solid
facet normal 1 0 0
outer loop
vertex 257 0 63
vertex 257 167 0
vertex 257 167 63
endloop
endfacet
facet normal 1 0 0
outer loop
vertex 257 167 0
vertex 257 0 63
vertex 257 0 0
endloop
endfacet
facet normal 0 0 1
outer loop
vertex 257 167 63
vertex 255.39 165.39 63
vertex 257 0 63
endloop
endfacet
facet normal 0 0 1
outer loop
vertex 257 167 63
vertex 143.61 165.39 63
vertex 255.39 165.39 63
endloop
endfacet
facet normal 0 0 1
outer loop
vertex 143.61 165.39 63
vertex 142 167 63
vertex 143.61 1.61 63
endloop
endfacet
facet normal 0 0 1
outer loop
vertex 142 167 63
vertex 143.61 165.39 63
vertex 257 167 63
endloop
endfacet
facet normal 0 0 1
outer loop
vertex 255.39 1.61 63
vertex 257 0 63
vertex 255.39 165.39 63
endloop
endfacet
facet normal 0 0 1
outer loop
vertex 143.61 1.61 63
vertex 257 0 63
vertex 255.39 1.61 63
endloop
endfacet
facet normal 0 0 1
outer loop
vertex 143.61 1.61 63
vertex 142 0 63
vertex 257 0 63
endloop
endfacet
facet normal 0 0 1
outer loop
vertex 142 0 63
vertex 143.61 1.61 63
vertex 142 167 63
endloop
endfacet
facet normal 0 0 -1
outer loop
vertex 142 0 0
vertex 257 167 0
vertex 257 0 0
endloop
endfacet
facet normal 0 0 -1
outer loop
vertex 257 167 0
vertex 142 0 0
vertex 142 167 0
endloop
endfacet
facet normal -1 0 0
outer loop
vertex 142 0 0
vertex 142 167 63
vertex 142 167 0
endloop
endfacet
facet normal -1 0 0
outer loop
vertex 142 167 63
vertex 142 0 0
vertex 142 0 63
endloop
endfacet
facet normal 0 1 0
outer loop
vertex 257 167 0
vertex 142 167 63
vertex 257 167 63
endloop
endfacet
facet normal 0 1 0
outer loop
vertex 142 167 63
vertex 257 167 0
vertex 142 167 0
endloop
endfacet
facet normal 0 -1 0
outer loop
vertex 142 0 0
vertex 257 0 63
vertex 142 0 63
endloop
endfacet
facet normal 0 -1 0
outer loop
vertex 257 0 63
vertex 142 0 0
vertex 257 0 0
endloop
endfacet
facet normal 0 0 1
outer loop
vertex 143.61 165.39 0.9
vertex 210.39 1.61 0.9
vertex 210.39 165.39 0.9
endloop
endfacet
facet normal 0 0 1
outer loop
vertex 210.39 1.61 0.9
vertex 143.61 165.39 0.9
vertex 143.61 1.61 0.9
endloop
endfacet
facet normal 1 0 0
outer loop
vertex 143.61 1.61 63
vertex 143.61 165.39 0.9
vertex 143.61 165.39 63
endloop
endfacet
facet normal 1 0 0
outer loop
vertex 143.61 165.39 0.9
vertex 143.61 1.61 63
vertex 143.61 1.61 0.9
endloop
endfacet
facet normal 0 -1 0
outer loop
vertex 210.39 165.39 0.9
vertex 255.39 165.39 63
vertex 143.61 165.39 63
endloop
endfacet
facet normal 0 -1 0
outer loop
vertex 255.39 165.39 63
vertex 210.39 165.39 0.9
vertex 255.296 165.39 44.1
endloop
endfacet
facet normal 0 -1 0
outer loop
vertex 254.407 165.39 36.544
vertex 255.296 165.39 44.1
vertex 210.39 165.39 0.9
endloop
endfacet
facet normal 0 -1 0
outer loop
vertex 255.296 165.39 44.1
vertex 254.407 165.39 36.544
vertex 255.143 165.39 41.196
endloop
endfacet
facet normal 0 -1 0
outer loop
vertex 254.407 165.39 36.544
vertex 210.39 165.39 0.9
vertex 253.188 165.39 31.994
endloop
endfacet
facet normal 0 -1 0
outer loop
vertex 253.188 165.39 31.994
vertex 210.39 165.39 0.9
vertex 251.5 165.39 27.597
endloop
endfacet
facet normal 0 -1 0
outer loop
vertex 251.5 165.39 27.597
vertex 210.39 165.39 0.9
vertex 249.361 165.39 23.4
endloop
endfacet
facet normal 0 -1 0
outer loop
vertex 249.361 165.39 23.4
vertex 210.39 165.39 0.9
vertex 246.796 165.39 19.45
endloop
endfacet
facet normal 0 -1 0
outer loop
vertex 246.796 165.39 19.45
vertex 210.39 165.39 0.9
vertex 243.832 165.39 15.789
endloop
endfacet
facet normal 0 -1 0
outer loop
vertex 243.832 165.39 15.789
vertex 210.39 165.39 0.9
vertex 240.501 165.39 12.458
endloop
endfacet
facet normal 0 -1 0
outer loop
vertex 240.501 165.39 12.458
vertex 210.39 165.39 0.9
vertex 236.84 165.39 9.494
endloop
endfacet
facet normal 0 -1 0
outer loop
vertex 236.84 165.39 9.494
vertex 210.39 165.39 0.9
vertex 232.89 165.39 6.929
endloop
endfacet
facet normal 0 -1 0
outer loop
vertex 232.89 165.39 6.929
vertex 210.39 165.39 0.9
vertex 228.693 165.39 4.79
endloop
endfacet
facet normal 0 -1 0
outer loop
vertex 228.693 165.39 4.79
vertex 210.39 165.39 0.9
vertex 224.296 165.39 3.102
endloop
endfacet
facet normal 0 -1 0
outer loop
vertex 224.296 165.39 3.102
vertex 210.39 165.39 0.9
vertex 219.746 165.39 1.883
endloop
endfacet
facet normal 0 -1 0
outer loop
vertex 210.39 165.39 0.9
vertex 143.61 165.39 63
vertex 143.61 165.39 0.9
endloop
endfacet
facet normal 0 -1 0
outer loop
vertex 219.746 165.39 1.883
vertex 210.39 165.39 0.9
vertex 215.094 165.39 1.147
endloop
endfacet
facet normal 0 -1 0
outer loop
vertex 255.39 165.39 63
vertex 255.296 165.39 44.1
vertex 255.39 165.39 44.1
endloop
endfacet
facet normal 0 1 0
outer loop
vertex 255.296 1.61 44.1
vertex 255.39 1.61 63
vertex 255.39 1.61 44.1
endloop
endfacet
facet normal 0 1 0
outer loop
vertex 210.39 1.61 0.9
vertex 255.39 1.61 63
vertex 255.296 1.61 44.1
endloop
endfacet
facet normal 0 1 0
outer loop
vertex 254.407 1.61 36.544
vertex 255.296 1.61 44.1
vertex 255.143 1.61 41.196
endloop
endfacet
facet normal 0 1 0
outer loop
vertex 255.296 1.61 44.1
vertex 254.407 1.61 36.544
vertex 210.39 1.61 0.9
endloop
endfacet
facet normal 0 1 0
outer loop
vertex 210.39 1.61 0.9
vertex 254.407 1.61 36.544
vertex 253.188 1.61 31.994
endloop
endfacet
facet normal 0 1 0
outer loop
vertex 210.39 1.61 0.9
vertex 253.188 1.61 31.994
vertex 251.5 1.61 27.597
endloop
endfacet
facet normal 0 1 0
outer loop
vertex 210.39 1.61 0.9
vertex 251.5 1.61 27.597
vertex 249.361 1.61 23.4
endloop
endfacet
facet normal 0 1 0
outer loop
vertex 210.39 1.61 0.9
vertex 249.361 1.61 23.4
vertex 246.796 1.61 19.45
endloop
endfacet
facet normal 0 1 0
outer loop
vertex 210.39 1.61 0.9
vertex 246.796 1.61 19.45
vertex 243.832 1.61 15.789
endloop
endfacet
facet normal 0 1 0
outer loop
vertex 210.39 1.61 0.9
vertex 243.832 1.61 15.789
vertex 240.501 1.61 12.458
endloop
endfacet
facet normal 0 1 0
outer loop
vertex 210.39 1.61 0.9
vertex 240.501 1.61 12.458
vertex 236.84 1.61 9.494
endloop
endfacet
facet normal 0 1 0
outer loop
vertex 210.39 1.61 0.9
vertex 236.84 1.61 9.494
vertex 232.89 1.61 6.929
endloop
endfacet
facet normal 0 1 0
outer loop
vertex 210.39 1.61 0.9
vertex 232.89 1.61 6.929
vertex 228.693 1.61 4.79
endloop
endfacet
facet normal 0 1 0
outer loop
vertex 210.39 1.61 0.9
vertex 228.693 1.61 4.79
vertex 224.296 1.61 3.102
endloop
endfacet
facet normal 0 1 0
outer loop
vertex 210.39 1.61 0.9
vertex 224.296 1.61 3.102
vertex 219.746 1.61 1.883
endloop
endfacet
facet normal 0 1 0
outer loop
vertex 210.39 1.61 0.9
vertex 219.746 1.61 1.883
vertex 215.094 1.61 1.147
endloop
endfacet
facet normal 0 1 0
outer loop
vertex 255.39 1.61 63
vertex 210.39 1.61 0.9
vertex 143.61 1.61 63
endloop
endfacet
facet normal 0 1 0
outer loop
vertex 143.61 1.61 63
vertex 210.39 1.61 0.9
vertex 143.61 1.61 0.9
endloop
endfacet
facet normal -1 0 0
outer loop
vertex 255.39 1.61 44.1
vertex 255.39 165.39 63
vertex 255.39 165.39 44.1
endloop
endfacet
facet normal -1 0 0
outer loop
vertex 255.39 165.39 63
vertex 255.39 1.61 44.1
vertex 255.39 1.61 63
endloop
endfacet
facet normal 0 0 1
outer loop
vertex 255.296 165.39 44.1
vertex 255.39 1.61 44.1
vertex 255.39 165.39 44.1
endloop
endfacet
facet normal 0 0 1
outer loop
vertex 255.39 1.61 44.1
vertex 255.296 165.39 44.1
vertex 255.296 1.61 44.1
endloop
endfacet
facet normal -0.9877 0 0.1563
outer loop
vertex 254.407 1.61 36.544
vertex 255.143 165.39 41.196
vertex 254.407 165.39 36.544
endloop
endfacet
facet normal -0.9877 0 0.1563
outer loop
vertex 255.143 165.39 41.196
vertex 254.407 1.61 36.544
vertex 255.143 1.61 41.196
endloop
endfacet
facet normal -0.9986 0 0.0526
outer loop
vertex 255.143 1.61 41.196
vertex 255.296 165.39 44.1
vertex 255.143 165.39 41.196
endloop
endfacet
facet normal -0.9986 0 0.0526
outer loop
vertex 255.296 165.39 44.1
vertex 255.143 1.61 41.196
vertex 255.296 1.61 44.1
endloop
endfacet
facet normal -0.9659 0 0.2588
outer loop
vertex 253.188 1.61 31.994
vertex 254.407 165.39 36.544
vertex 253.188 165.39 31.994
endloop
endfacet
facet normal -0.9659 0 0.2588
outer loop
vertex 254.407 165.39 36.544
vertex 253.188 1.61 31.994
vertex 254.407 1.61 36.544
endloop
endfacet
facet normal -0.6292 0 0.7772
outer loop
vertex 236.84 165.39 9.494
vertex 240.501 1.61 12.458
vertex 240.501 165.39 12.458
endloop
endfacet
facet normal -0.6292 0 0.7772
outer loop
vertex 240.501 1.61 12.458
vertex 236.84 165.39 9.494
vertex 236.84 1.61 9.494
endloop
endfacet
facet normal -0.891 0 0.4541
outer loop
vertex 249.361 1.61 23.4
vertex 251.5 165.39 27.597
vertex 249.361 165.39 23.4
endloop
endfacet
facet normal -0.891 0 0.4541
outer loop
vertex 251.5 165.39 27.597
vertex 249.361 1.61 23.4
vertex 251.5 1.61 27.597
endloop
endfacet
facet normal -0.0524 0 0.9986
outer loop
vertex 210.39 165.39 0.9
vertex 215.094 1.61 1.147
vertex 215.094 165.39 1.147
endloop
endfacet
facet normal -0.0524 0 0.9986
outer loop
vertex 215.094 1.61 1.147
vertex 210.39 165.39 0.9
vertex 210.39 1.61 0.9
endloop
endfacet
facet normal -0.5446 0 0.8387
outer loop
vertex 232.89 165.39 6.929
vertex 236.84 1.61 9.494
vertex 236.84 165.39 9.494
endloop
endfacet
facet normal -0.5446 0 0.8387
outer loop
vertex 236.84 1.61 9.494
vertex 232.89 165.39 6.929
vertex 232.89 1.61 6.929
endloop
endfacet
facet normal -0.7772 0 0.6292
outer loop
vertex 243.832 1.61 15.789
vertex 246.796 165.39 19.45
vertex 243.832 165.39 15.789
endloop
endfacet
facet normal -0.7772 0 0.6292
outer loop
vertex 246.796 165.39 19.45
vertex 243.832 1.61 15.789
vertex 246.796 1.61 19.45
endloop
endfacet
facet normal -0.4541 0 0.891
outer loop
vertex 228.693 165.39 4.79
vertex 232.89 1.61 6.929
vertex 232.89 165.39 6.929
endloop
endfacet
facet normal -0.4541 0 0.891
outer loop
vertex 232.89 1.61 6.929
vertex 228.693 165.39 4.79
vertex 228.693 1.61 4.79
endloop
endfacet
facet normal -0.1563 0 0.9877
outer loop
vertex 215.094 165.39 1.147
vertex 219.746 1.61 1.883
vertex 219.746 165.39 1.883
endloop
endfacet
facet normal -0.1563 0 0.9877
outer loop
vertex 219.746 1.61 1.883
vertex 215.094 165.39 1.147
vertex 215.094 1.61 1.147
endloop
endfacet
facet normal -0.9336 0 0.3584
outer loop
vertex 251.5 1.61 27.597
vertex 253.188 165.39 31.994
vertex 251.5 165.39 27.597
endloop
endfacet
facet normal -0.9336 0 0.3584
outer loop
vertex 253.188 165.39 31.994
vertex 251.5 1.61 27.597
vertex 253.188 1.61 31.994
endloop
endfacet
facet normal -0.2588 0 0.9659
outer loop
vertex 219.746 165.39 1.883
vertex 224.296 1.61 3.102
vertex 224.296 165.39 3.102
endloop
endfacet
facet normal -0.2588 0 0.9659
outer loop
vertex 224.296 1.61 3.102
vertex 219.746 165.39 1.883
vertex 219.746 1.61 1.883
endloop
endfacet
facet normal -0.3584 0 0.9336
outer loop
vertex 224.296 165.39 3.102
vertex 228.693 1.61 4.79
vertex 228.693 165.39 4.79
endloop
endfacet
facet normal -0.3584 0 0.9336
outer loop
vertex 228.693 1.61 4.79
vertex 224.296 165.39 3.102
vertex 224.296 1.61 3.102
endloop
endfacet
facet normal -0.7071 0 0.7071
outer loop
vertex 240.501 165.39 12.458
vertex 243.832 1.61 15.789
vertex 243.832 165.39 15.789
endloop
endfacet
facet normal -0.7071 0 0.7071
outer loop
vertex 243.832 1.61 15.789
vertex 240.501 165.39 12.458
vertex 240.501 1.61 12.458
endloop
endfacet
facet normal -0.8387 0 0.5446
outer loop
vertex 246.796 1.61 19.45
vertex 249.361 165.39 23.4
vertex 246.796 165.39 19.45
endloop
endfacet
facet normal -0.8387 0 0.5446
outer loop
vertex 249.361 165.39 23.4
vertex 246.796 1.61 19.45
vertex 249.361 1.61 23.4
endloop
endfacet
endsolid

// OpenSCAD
% cube([258, 258, 64]);

// cards are 62x93
// cardboard is 63x102

// 20mm of crisis cards
// 30mm of door cards

$fn=60;


if (0) {
translate([0,90,0]) tenCharBox();
resourceBox();
translate([0,45,0]) resourceBox();
translate([143,0,0]) rotate([0,0,90]) villianBox();
}

translate([108+34,0,0]) misc1();

module misc1() {
   wid = 257-108-34;
   len = 167;
   rad = 45;

   difference() {
      cube([wid,len,63]);

      translate([1.61,1.61,0.9]) cube([wid-2*1.61-rad,len-2*1.61,63]);
      translate([1.61,1.61,rad+-.9]) cube([wid-2*1.61,len-2*1.61,63]);

      translate([wid-1.61-rad,1.61,0.9+rad]) rotate([-90,0,0]) cylinder(r=rad,h=len-2*1.61);
   }
}


// 34 x 257 x 63
module villianBox() {
   difference() {
      cube([167+2*45,34,63]);

      translate([(108-93)/2,1.61,0.9]) cube([93,34-2*1.61,64]);
      translate([(108-68)/2,-1,40]) cube([68,180,60]);
      translate([(108-93)/2+103.25,1.61,0.9]) cube([93,34-2*1.61,64]);
      translate([(108-68)/2+103.25,-1,40]) cube([68,180,60]);
   }
}

// 108 x 167 x 63
module tenCharBox() {
   difference() {
      cube([108,167,63]);

      translate([15,-1,40]) cube([68,180,60]);
      for (i=[0:9]) {
         translate([2,2+i*16.5,1.2]) CharBoxCutout();
      }
   }
}

module CharBoxCutout() {
   translate([0,0,0.6]) {
      translate([0,9.9,0]) cube([104, 4, 64]);
      translate([0,0,1.2]) cube([93, 10, 64]);
   }
}

// 108 x 45 x 63
module resourceBox() {
   difference() {
      thick = 45;
      // cube([93+2*1.61, 45+2*1.61, 63]);
      cube([108, 45, 63]);

      translate([(108-93)/2,1.61,0.9]) cube([93,thick-2*1.61,64]);
      translate([(108-68)/2,-1,40]) cube([68,180,60]);
      translate([(108-68)/2+68/2,-1,42]) rotate([-90,0,0]) cylinder(d=68,h=10);
   }
}
